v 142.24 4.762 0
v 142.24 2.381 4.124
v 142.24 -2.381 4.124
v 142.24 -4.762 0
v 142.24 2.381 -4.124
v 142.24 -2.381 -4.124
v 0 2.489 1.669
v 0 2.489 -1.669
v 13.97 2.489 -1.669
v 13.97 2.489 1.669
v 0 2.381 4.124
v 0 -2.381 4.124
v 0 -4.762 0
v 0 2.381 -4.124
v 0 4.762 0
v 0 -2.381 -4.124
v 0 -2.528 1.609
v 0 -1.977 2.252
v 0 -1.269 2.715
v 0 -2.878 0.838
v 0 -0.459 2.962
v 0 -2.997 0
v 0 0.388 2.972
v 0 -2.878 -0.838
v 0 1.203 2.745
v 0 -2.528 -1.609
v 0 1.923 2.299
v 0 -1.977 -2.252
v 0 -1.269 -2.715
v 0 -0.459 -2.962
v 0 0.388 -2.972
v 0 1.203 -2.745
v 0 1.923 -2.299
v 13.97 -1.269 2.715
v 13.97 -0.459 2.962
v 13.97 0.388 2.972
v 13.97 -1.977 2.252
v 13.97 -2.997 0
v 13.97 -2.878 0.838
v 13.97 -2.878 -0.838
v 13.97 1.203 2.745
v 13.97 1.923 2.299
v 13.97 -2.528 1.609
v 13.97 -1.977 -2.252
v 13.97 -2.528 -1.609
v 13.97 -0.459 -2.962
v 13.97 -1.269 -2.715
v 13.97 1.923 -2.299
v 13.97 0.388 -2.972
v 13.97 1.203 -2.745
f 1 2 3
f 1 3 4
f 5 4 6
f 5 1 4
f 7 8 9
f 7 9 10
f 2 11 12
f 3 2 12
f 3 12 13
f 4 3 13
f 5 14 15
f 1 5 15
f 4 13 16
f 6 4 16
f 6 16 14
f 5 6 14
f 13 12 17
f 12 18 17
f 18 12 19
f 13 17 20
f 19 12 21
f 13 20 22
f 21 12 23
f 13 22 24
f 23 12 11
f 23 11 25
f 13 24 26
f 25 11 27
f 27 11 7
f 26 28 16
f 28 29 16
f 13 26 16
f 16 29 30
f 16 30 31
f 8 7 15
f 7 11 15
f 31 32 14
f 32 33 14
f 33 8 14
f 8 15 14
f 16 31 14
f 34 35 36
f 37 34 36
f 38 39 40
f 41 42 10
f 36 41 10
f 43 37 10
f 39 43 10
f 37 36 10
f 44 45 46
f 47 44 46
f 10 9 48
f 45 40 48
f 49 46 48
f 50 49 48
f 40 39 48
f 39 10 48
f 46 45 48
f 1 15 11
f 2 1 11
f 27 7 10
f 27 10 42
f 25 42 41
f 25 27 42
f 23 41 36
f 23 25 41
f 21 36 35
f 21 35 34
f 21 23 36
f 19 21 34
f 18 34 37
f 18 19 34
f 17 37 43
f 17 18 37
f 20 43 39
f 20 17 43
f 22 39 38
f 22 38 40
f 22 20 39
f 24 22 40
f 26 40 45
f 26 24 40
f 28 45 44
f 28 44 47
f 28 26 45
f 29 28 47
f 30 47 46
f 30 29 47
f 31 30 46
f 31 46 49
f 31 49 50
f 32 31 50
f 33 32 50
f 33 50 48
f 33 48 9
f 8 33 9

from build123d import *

# Parameters (mm, degrees)
AXLE_DEPTH       = 142.24
DRIVE_SLOT_DEPTH = 13.97


with BuildPart() as part:
    # Hex Profile → Axle (new body)
    with BuildSketch(Plane(origin=(0, 0, 0), x_dir=(0, 0, -1), z_dir=(1, 0, 0))):
        Polygon((4.124445986, -2.38125), (4.124445986, 2.38125), (0, 4.7625), (-4.124445986, 2.38125), (-4.124445986, -2.38125), (0, -4.7625), align=None)
    extrude(amount=AXLE_DEPTH)

    # Motor Shaft Profile → Drive  Slot (cut)
    with BuildSketch(Plane.ZY):
        with BuildLine():
            Line((-1.669458355, 2.4892), (1.669458355, 2.4892))
            ThreePointArc((1.669458355, 2.4892), (0, -2.9972), (-1.669458355, 2.4892))
        make_face()
    extrude(amount=-DRIVE_SLOT_DEPTH, mode=Mode.SUBTRACT)


solid = part.part
